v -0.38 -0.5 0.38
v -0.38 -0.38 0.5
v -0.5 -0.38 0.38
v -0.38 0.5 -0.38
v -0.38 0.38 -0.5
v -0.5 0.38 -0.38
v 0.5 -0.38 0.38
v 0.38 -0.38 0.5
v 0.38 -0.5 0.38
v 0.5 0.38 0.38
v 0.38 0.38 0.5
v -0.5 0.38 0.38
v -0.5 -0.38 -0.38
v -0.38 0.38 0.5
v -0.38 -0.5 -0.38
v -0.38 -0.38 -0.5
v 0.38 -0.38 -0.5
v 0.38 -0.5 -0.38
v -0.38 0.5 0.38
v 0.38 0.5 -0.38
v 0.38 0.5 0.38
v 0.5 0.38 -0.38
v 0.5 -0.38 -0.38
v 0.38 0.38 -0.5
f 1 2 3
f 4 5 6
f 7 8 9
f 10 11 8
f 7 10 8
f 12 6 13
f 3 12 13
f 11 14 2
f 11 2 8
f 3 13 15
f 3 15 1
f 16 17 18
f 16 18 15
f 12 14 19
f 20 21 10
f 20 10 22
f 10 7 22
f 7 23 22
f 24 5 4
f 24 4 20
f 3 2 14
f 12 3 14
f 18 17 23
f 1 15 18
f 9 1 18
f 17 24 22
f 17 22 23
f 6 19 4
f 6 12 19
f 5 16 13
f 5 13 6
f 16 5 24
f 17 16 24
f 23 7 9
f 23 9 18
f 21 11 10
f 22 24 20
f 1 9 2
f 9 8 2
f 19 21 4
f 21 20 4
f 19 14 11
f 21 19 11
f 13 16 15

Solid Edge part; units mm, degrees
sketch "Sketch1" plane through (0, 0, -0.5) normal (0, 0, 1) x (1, 0, 0)
  line L0 (-0.5, -0.5) -> (0.5, -0.5)
  line L1 (0.5, -0.5) -> (0.5, 0.5)
  line L2 (0.5, 0.5) -> (-0.5, 0.5)
  line L3 (-0.5, 0.5) -> (-0.5, -0.5)
extrude "ExtrudedProtrusion_2" add sketch "Sketch1" along normal blind 1
chamfer "Chamfer_5" distance 0.12 angle 45 12 edges at (-0.5, 0, 0.5) (0, 0.5, 0.5) (0.5, 0, 0.5) (0, -0.5, 0.5) (-0.5, 0, -0.5) (0, 0.5, -0.5) (0.5, 0, -0.5) (0, -0.5, -0.5) (0.5, -0.5, 0) (-0.5, -0.5, 0) (0.5, 0.5, 0) (-0.5, 0.5, 0)
